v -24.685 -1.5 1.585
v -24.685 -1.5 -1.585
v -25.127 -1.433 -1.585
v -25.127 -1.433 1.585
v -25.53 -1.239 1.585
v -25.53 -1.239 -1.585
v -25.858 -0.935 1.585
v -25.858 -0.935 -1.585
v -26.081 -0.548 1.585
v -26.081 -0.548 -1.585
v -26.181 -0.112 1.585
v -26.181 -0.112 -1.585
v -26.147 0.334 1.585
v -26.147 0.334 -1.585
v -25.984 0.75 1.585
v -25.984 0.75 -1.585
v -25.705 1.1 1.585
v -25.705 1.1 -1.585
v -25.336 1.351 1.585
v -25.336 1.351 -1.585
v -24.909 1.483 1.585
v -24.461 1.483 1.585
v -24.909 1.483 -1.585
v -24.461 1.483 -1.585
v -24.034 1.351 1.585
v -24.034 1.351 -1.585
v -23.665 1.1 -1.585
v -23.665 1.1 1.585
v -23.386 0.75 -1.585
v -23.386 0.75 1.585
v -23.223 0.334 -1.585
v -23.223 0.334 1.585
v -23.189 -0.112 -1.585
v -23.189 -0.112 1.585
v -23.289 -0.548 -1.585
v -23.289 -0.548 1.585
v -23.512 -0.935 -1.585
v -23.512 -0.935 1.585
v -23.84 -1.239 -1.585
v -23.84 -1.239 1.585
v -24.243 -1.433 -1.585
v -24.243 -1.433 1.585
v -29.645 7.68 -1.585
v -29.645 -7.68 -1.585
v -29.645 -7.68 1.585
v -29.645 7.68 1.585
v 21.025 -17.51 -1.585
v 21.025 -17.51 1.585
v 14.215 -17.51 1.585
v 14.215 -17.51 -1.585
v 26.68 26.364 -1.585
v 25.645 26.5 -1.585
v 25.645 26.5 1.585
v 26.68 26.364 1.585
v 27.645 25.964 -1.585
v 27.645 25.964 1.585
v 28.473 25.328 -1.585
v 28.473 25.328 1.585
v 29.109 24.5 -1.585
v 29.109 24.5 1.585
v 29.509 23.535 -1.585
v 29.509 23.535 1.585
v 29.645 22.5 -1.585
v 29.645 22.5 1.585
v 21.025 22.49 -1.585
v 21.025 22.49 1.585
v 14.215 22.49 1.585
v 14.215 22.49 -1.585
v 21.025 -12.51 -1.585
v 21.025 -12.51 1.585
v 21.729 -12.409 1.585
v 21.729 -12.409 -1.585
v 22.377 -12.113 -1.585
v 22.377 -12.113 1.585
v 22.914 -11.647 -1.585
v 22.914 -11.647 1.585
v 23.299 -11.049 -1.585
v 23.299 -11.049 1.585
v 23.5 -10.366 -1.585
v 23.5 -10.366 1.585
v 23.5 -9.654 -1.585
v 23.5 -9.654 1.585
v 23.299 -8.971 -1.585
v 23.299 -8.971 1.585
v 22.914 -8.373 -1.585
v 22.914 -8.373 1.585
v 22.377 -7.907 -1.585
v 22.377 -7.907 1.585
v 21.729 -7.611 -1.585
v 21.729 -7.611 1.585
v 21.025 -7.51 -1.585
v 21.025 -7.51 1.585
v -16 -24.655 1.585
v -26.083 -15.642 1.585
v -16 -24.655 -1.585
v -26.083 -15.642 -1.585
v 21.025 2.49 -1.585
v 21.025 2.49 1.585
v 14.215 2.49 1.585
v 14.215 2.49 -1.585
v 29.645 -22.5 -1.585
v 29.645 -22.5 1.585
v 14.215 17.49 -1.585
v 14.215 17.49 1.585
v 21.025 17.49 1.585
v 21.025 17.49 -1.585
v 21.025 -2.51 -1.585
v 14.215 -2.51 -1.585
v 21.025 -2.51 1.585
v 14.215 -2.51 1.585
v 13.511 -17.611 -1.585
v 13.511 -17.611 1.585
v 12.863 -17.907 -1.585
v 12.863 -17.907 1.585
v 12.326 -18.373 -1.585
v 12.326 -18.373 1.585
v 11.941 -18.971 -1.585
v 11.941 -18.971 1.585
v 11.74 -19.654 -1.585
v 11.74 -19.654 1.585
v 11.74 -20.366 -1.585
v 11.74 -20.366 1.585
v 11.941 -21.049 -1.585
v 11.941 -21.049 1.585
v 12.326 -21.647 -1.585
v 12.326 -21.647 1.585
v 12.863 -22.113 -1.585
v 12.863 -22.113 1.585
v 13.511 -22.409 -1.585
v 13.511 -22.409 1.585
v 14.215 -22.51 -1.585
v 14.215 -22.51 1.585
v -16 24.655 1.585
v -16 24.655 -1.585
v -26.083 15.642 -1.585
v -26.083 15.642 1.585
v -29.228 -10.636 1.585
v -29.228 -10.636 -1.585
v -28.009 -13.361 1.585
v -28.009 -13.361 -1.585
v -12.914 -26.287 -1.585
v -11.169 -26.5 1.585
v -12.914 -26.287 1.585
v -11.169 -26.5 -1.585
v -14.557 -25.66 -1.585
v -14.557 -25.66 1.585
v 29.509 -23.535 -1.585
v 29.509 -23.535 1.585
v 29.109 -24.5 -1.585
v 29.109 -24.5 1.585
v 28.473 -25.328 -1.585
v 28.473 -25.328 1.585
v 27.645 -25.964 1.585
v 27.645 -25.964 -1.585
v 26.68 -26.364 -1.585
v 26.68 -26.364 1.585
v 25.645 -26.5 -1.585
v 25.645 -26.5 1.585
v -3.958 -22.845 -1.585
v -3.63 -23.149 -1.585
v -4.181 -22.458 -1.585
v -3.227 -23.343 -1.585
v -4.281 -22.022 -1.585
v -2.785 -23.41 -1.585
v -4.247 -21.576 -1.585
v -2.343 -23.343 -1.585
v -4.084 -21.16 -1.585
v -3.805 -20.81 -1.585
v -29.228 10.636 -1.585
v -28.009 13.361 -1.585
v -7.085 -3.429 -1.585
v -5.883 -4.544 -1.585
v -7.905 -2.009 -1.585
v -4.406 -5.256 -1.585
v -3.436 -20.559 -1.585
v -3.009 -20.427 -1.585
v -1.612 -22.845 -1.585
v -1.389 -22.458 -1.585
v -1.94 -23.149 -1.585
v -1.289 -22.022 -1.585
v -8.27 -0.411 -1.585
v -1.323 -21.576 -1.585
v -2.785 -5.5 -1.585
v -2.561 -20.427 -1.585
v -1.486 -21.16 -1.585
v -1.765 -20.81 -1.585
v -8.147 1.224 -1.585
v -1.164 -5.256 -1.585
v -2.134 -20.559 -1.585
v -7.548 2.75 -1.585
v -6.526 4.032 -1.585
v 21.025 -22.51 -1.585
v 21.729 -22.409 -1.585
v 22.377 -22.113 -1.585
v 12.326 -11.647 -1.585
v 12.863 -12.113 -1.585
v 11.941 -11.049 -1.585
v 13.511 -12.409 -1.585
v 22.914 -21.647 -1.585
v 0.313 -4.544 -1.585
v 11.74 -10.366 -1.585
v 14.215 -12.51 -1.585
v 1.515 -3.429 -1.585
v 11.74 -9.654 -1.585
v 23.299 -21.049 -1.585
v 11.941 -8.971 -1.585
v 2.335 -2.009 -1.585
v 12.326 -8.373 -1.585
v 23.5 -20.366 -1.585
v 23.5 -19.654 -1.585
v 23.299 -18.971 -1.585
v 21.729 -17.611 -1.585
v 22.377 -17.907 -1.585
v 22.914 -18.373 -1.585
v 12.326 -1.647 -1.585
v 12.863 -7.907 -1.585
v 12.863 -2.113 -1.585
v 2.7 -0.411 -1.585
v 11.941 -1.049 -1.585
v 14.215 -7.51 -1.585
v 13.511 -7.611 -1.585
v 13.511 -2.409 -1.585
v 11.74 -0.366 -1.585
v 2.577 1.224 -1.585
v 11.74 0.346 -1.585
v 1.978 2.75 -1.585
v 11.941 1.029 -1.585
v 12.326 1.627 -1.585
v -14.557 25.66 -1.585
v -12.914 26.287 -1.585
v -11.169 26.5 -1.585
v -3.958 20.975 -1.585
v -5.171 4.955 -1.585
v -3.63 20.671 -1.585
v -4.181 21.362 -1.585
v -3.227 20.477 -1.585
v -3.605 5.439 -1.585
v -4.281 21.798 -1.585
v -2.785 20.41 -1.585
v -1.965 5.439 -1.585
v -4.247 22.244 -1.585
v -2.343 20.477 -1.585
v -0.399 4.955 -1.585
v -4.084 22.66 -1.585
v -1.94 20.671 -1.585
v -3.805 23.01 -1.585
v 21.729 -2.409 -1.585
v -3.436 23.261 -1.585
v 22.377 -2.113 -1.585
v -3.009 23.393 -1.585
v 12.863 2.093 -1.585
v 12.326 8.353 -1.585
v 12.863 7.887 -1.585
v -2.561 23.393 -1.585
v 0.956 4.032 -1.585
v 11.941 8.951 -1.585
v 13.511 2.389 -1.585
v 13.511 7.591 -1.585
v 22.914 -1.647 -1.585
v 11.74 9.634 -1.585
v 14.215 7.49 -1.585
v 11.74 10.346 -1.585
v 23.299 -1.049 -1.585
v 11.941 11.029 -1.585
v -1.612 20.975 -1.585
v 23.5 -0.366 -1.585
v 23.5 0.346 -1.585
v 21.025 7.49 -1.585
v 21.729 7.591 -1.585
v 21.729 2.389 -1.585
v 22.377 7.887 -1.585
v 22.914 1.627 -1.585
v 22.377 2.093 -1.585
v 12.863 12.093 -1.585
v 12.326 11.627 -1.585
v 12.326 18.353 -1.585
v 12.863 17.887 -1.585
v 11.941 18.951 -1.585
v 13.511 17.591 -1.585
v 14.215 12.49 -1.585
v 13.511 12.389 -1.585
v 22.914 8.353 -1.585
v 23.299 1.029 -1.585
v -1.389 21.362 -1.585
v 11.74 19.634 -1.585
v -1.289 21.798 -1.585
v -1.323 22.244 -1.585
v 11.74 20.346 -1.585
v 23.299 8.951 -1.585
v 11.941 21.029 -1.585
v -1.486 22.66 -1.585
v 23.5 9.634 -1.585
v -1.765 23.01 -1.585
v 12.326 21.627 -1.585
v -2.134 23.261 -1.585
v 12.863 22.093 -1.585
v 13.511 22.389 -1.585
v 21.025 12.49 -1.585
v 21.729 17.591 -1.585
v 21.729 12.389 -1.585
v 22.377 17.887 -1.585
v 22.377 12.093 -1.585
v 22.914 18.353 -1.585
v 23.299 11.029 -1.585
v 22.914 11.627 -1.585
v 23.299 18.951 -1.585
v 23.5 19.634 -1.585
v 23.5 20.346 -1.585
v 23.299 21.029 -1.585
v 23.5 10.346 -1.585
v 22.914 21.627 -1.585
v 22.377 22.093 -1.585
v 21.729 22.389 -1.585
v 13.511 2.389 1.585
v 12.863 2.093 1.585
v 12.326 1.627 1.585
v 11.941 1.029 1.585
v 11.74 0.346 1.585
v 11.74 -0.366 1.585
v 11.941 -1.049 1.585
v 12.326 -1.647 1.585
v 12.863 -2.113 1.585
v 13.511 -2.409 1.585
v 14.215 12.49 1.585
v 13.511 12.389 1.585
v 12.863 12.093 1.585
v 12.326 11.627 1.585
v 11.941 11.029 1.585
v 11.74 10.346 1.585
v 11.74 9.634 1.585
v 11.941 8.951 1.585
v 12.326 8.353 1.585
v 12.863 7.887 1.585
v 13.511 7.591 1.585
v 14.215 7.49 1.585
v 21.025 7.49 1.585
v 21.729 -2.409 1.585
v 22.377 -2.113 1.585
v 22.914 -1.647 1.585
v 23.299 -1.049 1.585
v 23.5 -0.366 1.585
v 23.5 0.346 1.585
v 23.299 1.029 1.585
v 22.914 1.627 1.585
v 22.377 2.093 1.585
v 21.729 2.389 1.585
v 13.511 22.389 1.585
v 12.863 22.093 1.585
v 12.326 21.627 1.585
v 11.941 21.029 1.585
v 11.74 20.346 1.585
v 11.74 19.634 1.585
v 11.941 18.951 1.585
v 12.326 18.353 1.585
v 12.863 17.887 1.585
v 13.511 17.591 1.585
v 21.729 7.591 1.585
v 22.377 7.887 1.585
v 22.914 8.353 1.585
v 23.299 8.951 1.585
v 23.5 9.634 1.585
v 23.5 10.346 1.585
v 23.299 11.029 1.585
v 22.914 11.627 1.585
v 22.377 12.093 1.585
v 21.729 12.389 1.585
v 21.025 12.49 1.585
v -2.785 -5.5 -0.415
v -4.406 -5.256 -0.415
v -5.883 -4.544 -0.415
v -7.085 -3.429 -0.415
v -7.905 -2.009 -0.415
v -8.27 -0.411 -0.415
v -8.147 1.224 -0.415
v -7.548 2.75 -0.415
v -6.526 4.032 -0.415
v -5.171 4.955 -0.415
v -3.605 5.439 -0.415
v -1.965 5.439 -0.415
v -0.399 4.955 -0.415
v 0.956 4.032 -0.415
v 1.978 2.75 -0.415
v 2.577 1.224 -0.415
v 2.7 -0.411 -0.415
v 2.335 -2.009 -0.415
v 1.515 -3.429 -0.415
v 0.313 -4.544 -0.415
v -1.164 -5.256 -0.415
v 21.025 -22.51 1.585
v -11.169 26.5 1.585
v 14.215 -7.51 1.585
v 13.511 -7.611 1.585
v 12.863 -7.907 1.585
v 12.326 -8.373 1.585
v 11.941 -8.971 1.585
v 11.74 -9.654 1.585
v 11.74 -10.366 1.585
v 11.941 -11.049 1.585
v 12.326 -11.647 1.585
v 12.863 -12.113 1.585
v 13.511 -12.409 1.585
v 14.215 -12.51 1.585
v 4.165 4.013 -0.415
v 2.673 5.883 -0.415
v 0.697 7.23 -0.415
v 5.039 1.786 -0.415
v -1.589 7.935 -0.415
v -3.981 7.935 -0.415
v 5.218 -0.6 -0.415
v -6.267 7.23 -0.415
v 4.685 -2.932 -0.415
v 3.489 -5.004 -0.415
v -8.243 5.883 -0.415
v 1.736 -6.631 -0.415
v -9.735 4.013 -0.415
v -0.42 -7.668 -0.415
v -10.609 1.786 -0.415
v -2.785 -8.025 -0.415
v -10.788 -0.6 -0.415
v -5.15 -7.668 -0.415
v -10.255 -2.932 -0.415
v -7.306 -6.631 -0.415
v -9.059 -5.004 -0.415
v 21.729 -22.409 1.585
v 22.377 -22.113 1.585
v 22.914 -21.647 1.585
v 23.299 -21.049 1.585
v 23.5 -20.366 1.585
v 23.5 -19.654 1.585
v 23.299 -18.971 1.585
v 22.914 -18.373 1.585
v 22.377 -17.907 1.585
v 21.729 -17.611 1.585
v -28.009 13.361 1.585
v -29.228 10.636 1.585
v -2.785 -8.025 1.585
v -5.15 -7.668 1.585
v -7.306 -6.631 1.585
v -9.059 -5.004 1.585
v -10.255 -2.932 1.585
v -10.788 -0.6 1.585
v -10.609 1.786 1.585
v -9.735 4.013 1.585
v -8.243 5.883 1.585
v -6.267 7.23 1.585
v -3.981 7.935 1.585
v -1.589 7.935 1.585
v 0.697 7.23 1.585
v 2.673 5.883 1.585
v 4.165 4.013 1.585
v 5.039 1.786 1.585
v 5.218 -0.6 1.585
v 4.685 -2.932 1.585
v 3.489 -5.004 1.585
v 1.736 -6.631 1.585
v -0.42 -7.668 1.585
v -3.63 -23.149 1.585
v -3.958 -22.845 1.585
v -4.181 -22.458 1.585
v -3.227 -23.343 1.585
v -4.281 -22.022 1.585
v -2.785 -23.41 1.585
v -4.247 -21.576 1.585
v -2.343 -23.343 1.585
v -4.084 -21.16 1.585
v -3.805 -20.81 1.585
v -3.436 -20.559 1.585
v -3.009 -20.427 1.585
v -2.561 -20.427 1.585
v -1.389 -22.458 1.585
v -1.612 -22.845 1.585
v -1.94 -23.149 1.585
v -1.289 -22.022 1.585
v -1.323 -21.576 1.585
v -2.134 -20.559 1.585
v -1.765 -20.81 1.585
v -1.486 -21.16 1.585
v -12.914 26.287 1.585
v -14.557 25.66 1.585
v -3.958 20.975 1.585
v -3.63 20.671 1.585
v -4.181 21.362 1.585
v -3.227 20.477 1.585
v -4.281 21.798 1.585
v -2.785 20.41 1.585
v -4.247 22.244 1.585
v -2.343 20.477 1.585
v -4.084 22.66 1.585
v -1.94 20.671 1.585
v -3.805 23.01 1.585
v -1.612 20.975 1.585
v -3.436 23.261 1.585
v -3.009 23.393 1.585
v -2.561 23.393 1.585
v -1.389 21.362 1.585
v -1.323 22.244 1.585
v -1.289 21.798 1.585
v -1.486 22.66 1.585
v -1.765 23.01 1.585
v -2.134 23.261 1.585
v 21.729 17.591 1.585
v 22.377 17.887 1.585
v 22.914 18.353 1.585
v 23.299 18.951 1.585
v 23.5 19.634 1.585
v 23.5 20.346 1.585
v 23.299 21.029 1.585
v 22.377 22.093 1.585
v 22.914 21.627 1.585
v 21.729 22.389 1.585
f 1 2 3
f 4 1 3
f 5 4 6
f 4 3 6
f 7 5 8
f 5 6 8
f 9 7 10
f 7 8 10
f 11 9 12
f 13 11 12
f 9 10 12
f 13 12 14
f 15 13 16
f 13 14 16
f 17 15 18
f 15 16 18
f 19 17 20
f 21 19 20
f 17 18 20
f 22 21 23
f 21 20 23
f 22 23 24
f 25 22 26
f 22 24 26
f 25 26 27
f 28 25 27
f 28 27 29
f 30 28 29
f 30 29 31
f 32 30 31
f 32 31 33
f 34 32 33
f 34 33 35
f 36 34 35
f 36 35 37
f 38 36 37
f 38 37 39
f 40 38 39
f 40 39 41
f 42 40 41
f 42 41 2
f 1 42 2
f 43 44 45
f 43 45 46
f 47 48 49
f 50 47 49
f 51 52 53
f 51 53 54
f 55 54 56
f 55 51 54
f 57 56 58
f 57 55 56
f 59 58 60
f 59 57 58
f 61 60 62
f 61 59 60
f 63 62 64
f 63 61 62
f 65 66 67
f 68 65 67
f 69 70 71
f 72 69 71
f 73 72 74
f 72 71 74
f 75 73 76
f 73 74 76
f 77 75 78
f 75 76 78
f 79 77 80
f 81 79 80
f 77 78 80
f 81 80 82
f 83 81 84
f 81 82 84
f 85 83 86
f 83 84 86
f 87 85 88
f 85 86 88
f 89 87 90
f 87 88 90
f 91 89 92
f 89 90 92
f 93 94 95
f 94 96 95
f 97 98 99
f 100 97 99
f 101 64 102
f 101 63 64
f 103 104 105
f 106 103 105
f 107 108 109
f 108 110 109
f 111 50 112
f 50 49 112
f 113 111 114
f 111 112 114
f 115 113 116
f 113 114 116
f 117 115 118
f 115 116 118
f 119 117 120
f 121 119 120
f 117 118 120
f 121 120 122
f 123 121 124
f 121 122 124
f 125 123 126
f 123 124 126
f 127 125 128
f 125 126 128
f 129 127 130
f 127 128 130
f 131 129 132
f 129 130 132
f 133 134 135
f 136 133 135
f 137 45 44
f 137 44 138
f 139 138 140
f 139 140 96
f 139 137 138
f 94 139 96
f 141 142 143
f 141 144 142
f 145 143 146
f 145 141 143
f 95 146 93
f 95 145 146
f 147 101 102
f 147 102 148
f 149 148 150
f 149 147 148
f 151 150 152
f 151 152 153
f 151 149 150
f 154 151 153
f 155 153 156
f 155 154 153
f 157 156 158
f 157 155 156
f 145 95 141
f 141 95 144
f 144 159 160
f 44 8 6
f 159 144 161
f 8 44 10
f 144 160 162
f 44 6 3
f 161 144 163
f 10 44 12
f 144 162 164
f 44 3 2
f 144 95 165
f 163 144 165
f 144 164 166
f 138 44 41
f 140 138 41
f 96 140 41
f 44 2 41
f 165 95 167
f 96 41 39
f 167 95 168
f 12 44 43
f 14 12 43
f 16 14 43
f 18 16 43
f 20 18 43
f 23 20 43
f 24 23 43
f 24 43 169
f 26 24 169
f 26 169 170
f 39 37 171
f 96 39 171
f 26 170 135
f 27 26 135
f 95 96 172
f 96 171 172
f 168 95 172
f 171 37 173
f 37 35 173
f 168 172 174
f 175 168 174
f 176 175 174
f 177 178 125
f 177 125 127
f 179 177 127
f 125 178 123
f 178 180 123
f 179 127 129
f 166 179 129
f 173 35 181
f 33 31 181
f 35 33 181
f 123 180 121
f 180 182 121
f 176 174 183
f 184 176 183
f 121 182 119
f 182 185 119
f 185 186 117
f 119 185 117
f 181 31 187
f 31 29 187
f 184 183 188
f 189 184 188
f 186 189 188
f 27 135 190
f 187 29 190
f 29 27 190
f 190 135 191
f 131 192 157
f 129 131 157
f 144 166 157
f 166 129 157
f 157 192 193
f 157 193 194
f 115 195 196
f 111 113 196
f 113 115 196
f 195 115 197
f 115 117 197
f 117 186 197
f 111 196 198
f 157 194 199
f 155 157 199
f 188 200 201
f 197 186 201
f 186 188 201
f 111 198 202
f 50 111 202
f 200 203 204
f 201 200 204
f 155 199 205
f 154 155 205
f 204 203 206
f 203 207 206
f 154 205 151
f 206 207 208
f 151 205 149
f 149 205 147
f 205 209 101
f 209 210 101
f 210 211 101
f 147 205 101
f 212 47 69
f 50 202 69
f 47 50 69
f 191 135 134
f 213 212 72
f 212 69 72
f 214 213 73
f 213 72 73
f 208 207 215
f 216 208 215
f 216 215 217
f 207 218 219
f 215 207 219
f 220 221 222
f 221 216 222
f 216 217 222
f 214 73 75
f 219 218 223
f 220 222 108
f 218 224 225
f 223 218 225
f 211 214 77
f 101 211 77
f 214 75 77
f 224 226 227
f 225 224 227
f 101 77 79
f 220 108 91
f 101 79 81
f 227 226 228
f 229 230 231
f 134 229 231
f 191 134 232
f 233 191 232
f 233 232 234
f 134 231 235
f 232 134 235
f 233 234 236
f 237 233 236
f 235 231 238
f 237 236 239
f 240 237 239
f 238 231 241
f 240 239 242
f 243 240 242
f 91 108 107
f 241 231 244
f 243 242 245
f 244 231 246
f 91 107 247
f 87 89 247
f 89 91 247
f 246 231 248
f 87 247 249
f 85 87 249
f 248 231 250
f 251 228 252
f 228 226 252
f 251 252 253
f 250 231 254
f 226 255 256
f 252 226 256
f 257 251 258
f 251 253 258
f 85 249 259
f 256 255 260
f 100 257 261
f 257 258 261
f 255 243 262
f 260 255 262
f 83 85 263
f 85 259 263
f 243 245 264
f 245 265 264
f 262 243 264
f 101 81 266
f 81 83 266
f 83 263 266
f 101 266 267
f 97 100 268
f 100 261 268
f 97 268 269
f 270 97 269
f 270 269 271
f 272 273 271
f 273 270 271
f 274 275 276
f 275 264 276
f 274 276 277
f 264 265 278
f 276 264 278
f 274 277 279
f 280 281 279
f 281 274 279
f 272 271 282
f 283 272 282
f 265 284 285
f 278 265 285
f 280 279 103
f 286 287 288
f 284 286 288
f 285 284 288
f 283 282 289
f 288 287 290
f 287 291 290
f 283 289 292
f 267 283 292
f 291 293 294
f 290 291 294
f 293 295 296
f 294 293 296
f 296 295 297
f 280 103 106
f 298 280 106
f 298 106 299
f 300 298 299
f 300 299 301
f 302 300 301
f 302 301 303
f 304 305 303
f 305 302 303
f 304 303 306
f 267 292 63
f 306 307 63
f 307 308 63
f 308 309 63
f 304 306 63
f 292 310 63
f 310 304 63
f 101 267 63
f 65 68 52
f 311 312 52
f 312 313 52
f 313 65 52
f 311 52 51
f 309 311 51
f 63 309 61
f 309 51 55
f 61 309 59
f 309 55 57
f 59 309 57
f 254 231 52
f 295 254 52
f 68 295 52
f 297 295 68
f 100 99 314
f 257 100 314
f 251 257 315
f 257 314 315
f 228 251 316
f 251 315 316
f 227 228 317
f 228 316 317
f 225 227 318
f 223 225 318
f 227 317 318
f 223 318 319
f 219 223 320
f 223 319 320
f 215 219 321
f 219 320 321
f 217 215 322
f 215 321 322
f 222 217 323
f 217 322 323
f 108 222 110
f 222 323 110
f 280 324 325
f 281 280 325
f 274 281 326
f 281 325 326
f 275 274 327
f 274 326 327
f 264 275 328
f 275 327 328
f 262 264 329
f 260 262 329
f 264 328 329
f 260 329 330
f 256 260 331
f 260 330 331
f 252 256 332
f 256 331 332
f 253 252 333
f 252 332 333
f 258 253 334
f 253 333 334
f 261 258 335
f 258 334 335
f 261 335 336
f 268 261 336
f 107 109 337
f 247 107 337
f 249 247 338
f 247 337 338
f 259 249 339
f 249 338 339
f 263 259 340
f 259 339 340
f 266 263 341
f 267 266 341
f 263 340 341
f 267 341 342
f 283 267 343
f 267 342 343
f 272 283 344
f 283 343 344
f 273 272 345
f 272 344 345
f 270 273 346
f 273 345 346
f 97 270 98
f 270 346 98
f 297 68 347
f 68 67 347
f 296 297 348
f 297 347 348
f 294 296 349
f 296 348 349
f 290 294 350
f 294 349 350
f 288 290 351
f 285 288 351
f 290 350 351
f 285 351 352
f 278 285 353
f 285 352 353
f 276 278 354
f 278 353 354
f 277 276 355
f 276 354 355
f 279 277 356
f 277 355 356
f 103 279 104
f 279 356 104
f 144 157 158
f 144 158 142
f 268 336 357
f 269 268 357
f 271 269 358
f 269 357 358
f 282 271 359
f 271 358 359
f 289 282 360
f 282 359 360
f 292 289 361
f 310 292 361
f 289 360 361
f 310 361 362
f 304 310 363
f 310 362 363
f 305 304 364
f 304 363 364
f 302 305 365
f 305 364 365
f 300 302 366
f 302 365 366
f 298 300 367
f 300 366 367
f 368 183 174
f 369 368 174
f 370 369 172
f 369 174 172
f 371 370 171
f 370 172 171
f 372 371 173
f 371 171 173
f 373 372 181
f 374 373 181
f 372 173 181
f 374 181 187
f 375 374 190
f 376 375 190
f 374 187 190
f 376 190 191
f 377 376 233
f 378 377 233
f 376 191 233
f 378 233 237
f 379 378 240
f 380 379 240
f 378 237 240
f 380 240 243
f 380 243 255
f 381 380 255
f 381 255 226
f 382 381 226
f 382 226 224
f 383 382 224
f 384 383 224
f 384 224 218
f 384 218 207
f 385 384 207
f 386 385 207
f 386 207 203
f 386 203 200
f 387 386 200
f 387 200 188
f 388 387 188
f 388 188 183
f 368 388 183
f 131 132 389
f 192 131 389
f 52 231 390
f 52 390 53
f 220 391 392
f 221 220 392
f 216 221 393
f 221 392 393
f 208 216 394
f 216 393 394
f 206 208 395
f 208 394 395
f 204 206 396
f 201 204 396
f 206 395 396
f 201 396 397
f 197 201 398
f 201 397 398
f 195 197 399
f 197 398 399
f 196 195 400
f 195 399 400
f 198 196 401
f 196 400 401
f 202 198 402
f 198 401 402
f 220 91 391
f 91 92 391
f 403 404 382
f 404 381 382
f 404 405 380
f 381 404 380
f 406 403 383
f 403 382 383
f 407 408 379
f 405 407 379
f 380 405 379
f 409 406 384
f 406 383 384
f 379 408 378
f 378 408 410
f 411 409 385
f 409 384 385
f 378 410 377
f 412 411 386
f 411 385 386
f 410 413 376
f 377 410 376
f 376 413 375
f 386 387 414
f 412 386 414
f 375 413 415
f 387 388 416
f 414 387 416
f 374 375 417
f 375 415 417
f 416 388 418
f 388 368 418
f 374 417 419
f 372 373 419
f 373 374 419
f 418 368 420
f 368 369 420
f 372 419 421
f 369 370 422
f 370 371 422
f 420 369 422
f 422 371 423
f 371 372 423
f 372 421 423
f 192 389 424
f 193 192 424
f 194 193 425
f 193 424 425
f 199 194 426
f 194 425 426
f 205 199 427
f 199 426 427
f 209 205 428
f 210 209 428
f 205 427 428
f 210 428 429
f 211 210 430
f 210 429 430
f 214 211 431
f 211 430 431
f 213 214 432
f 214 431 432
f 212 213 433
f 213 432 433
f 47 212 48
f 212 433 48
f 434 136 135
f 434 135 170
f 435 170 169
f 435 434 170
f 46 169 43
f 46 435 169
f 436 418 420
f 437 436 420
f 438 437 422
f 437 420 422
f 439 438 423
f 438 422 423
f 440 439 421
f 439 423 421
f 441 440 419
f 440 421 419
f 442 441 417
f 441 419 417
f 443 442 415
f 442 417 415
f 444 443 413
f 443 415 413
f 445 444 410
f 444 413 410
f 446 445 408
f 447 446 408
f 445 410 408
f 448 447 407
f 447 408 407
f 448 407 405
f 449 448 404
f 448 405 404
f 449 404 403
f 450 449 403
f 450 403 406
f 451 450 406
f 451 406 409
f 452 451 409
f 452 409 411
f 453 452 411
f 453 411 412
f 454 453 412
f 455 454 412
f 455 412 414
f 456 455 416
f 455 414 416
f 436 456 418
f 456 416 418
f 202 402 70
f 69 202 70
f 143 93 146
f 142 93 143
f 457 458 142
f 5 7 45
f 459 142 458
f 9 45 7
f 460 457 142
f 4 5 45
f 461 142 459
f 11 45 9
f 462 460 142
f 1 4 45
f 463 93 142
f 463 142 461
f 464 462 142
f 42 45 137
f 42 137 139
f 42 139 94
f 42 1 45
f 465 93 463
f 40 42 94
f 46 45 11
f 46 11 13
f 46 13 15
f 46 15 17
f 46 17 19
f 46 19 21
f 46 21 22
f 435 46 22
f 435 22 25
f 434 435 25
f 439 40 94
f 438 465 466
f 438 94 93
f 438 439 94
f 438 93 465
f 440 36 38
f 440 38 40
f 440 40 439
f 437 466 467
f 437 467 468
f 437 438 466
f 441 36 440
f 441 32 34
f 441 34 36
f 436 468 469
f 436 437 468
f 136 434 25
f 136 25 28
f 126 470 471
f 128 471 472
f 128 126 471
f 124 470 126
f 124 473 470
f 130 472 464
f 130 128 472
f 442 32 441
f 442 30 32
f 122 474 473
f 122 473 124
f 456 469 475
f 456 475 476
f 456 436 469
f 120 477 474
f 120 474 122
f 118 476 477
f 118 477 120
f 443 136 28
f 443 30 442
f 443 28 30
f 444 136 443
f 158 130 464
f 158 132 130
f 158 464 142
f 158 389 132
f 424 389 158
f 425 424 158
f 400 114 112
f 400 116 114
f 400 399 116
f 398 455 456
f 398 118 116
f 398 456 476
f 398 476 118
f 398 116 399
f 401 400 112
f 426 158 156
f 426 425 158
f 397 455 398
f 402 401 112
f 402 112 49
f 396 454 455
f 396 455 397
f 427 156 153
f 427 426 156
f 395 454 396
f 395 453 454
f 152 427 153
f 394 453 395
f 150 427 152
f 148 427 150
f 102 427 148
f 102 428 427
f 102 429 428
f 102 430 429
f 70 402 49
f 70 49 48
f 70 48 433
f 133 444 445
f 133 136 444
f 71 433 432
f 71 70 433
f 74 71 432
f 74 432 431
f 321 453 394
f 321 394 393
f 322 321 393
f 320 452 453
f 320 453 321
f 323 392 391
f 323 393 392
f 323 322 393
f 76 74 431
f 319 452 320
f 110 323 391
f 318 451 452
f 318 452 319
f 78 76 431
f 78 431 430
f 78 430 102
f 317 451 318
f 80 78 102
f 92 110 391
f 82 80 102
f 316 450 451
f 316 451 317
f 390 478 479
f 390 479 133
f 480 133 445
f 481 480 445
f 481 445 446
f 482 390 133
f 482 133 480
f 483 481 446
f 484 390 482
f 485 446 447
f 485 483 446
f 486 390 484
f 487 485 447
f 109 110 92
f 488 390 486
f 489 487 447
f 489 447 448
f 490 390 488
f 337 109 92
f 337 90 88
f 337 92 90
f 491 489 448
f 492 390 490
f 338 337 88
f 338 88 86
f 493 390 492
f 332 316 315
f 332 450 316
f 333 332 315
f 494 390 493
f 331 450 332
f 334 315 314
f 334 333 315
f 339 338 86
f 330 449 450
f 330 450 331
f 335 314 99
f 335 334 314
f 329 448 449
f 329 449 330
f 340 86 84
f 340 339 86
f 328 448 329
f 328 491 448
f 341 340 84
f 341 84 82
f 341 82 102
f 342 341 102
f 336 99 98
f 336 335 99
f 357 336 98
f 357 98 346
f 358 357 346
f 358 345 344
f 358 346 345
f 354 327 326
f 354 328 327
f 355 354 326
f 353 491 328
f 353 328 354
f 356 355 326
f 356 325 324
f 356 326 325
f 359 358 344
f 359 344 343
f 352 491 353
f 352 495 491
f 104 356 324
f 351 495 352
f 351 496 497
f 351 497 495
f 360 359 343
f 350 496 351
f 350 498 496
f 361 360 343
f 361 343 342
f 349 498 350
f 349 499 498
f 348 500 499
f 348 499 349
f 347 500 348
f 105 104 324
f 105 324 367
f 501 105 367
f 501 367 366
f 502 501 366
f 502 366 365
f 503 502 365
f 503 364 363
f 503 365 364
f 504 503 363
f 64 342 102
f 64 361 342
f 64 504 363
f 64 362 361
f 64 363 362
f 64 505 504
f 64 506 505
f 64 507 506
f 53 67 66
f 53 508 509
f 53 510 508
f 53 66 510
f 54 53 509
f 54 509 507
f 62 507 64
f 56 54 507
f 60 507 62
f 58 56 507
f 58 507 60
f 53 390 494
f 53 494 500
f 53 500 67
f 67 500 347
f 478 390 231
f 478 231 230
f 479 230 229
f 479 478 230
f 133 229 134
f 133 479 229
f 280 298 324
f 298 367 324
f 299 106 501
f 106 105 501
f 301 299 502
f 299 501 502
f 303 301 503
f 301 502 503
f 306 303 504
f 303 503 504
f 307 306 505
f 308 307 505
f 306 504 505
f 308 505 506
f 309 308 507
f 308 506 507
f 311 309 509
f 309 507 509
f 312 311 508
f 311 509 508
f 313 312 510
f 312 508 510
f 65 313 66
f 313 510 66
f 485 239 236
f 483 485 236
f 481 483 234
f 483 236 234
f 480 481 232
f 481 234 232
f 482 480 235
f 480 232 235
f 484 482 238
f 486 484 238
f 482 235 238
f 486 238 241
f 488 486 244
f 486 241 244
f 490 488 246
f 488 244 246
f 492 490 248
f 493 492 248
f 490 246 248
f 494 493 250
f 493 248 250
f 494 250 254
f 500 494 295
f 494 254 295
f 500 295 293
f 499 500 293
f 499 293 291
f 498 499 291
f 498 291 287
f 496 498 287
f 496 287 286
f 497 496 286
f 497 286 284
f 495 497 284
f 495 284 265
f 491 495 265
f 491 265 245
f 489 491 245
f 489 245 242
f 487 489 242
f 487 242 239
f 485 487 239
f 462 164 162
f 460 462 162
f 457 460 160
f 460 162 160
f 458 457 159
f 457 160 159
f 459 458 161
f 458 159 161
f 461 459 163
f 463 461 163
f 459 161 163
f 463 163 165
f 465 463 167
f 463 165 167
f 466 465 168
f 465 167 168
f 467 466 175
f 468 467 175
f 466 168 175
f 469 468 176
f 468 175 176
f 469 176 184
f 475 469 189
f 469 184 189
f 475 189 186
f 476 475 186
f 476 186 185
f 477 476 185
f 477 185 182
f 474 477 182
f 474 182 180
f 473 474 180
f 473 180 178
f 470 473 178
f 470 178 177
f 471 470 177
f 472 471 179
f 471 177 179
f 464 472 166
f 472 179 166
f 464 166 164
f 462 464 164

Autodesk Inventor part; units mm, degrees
ref_plane "YZ Plane" through (0, 0, 0) normal (1, 0, 0) x (0, 1, 0)
ref_plane "XZ Plane" through (0, 0, 0) normal (0, 1, 0) x (-1, 0, 0)
ref_plane "XY Plane" through (0, 0, 0) normal (0, 0, 1) x (1, 0, 0)
sketch "Sketch1" plane through (0, 0, 0) normal (0, 0, 1) x (1, 0, 0)
  line L0 (-13.9366, 26.5) -> (29.645, 26.5)
  line L1 (29.645, 26.5) -> (29.645, -26.5)
  line L2 (29.645, -26.5) -> (-13.9366, -26.5)
  line L3 (-29.645, -12.4581) -> (-29.645, 12.4581)
  line L4 (-29.645, 26.5) -> (29.645, -26.5) construction
  line L5 (29.645, 26.5) -> (-29.645, -26.5) construction
  circle A0 centre (-11.1685, 19.25) radius 7.25 construction
  circle A1 centre (-18.965, 7.68) radius 10.68 construction
  line L6 (-29.645, 7.68) -> (29.645, 7.68) construction
  line L7 (29.645, 0) -> (-29.645, 0) construction
  line L8 (29.645, 26.5) -> (-12.105, 26.5) construction
  line L9 (-16.0003, 24.6552) -> (-26.0827, 15.6424) construction
  line L10 (-13.9366, 26.5) -> (-29.645, 12.4581)
  line L11 (-29.645, -12.4581) -> (-13.9366, -26.5)
  line L12 (-13.9366, 26.5) -> (-13.9366, -26.5) construction
  point P0 (0, 0)
  dimension "d3" = 14.5
  dimension "d4" = 21.36
  dimension "d0" = 59.29
  dimension "d2" = 53
  dimension "d6" = 7.68
  dimension "d7" = 41.75
  dimension "d8" = 12.4581
  dimension "d9" = 12.4581
  dimension "d10" = 43.5816
  dimension "d11" = 59.29
extrude "Extrusion1" add sketch "Sketch1" along normal mid plane 3.17
sketch "Sketch2" plane through (0, 0, 1.585) normal (0, 0, 1) x (1, 0, 0)
  line L0 (-29.645, 12.4581) -> (-29.645, -12.4581) projected
  line L1 (-13.9366, -26.5) -> (29.645, -26.5) projected
  line L2 (21.025, -17.51) -> (14.215, -17.51)
  line L3 (14.215, -17.51) -> (14.215, -22.51)
  line L4 (14.215, -22.51) -> (21.025, -22.51)
  line L5 (21.025, -22.51) -> (21.025, -17.51)
  line L6 (21.025, -17.51) -> (14.215, -22.51) construction
  line L7 (14.215, -17.51) -> (21.025, -22.51) construction
  arc A0 (14.215, -17.51) -> (14.215, -22.51) centre (14.215, -20.01) ccw
  arc A1 (21.025, -22.51) -> (21.025, -17.51) centre (21.025, -20.01) ccw
  point P0 (0, 0)
  point P1 (17.62, -20.01)
  dimension "d14" = 6.49
  dimension "d15" = 6.81
  dimension "d16" = 5
  dimension "d17" = 11.81
  dimension "d18" = 43.86
extrude "Extrusion2" cut sketch "Sketch2" against normal through all
pattern_linear "Rectangular Pattern1" count 5 spacing 10 along (0, 1, 0) of "Extrusion2"
sketch "Sketch3" plane through (0, 0, 1.585) normal (0, 0, 1) x (1, 0, 0)
  line L0 (-29.645, 12.4581) -> (-29.645, -12.4581) projected
  point P0 (0, 0)
  point P1 (-2.785, 0)
  dimension "d24" = 26.86
hole "Hole1" at (-2.785, 0, 1.585) direction (0, 0, -1) diameter 11 end through all counterbore diameter 16.05 counterbore depth 2
sketch "Sketch4" plane through (0, 0, 1.585) normal (0, 0, 1) x (1, 0, 0)
  circle A0 centre (-2.785, 0) radius 8.025 projected
  line L0 (-29.645, 12.4581) -> (-29.645, -12.4581) projected
  point P0 (0, 0)
  point P1 (-2.785, 21.91)
  point P2 (-2.785, -21.91)
  point P3 (-24.685, 0)
  dimension "d34" = 26.86
  dimension "d35" = 43.82
  dimension "d36" = 21.91
  dimension "d37" = 4.96
  dimension "d38" = 21.9
hole "Hole2" at (-2.785, 21.91, 1.585) at (-2.785, -21.91, 1.585) at (-24.685, 0, 1.585) direction (0, 0, -1) diameter 3 end through all
fillet "Fillet1" radius 7.25 1 edges at (-13.9366, -26.5, 0)
fillet "Fillet2" radius 7.25 1 edges at (-13.9366, 26.5, 0)
fillet "Fillet3" radius 10.68 2 edges at (-29.645, 12.4581, 0) (-29.645, -12.4581, 0)
fillet "Fillet4" radius 4 2 edges at (29.645, -26.5, 0) (29.645, 26.5, 0)
equation "\"d9\" = d8"
properties part number "Threaded Rod Plate" material "Aluminum 6061"
